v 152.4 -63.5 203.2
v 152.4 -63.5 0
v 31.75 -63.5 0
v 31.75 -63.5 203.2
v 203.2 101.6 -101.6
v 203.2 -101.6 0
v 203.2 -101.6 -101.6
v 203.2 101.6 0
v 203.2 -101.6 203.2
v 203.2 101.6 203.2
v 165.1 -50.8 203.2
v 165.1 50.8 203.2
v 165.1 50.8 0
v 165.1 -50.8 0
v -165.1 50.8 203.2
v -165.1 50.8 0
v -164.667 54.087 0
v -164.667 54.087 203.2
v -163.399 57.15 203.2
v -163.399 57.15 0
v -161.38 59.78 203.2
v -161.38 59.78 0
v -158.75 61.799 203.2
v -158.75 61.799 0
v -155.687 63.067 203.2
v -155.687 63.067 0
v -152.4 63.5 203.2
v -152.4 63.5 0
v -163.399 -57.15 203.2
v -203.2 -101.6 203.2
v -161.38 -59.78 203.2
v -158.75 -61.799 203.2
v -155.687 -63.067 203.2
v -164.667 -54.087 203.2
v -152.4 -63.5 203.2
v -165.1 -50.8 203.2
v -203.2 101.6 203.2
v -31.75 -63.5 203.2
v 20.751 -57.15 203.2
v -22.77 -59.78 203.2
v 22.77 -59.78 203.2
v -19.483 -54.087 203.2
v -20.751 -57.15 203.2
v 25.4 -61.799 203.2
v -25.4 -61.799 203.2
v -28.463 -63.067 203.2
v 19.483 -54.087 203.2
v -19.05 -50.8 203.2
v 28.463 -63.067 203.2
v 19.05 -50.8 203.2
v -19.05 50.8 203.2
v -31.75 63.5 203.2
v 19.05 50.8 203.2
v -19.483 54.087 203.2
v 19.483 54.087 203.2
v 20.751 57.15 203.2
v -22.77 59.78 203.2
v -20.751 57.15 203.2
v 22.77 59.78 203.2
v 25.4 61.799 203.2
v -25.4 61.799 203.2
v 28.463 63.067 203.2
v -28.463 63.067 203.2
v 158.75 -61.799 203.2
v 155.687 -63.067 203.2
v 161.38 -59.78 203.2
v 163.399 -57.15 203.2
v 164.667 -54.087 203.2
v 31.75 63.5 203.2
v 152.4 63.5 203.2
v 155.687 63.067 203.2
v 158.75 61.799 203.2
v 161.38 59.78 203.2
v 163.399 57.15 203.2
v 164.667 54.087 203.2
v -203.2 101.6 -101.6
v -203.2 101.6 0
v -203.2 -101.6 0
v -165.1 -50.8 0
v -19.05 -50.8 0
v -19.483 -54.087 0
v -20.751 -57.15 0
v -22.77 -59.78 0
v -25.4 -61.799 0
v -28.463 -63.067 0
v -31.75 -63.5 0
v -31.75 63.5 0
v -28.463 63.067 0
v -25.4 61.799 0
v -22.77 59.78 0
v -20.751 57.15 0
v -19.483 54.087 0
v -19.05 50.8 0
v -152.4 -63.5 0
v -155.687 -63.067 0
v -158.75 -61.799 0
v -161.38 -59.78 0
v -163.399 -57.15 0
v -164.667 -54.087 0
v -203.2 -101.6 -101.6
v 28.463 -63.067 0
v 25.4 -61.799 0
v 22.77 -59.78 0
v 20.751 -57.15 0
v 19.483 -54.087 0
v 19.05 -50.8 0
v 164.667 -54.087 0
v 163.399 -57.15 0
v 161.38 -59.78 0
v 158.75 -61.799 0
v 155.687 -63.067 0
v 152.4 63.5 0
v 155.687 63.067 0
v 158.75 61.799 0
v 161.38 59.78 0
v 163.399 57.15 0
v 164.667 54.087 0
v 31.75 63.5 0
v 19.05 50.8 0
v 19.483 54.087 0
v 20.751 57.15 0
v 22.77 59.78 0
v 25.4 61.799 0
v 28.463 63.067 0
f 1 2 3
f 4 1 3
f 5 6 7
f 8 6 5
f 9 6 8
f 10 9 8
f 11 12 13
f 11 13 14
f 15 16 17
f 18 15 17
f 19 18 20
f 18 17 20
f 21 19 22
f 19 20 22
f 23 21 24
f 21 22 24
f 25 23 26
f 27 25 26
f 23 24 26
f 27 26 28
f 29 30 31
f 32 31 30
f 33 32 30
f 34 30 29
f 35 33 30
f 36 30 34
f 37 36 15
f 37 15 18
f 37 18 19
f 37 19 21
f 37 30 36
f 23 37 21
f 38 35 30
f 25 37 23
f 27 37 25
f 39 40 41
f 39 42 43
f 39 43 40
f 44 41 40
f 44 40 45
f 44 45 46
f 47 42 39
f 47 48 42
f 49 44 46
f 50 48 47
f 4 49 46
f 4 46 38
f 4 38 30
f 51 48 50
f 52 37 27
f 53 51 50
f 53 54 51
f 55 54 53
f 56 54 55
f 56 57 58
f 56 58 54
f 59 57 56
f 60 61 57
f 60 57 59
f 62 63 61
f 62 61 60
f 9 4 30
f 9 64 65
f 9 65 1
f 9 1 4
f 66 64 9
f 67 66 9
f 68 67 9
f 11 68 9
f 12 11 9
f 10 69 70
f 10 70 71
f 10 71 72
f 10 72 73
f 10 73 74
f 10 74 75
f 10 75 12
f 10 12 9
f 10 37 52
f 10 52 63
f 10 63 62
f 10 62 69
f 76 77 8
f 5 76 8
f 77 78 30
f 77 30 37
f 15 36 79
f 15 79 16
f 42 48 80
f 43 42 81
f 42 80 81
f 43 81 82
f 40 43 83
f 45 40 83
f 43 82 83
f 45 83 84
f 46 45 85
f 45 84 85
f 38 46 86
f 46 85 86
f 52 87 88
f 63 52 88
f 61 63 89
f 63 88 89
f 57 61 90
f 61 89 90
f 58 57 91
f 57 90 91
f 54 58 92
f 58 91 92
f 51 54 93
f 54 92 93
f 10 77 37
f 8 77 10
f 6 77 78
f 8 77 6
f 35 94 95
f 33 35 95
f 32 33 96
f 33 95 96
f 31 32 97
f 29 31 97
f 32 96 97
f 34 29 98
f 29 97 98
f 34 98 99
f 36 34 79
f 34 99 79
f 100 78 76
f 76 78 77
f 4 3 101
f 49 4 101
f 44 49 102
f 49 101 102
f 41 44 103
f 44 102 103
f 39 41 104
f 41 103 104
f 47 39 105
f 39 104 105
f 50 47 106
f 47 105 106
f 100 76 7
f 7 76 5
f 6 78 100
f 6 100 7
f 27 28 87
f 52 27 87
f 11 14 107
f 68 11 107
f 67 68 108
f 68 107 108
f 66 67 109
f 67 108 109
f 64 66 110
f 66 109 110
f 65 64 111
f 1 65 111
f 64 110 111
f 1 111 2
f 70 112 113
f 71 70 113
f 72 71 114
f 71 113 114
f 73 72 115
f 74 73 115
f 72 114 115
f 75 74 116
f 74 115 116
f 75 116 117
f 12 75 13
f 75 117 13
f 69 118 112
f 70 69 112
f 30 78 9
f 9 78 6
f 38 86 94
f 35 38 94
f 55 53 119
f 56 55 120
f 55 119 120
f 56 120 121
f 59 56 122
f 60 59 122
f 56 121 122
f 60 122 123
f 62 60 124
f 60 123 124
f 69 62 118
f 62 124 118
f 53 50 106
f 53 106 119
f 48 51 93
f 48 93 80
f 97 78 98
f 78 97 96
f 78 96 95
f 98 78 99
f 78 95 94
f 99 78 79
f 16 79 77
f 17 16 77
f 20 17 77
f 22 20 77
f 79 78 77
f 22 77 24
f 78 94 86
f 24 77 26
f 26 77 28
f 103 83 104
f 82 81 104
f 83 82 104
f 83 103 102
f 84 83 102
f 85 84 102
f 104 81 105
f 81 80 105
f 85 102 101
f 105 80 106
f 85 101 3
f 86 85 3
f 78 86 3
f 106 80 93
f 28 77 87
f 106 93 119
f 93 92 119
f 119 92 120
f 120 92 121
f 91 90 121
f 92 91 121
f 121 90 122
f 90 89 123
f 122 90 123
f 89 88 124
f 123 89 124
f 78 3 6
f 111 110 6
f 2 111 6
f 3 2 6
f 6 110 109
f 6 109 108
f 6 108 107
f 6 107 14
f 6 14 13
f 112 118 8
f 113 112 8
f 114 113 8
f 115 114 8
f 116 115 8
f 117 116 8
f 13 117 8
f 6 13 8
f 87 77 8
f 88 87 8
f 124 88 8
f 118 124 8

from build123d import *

# Parameters (mm, degrees)
F1_W     = 406.4
F1_H     = 203.2
F2_DEPTH = 203.2
F3_DEPTH = 101.6


# Not quite as in the source:
# - a variable given as a bare number and used for a length is read in inches; the dataset says mm whatever the document's units were


with BuildPart() as f2:
    # F1 (on Top) → F2 (new body)
    with BuildSketch(Plane.XY):
        Rectangle(F1_W, F1_H)
        with BuildLine():
            ThreePointArc((-165.1, 50.8), (-161.3802561211, 59.7802561211), (-152.4, 63.5))
            Line((-152.4, 63.5), (-31.75, 63.5))
            ThreePointArc((-31.75, 63.5), (-22.7697438789, 59.7802561211), (-19.05, 50.8))
            Line((-19.05, 50.8), (-19.05, -50.8))
            ThreePointArc((-19.05, -50.8), (-22.7697438789, -59.7802561211), (-31.75, -63.5))
            Line((-31.75, -63.5), (-152.4, -63.5))
            ThreePointArc((-152.4, -63.5), (-161.3802561211, -59.7802561211), (-165.1, -50.8))
            Line((-165.1, -50.8), (-165.1, 50.8))
        make_face(mode=Mode.SUBTRACT)
        with BuildLine():
            Line((19.05, -50.8), (19.05, 50.8))
            ThreePointArc((19.05, 50.8), (22.7697438789, 59.7802561211), (31.75, 63.5))
            Line((31.75, 63.5), (152.4, 63.5))
            ThreePointArc((152.4, 63.5), (161.3802561211, 59.7802561211), (165.1, 50.8))
            Line((165.1, 50.8), (165.1, -50.8))
            ThreePointArc((165.1, -50.8), (161.3802561211, -59.7802561211), (152.4, -63.5))
            Line((152.4, -63.5), (31.75, -63.5))
            ThreePointArc((31.75, -63.5), (22.7697438789, -59.7802561211), (19.05, -50.8))
        make_face(mode=Mode.SUBTRACT)
    extrude(amount=F2_DEPTH)


with BuildPart() as f3:
    # F1 (on Top) → F3 (new body)
    with BuildSketch(Plane.XY):
        Rectangle(F1_W, F1_H)
        with BuildLine():
            ThreePointArc((-165.1, 50.8), (-161.3802561211, 59.7802561211), (-152.4, 63.5))
            Line((-152.4, 63.5), (-31.75, 63.5))
            ThreePointArc((-31.75, 63.5), (-22.7697438789, 59.7802561211), (-19.05, 50.8))
            Line((-19.05, 50.8), (-19.05, -50.8))
            ThreePointArc((-19.05, -50.8), (-22.7697438789, -59.7802561211), (-31.75, -63.5))
            Line((-31.75, -63.5), (-152.4, -63.5))
            ThreePointArc((-152.4, -63.5), (-161.3802561211, -59.7802561211), (-165.1, -50.8))
            Line((-165.1, -50.8), (-165.1, 50.8))
        make_face(mode=Mode.SUBTRACT)
        with BuildLine():
            Line((19.05, -50.8), (19.05, 50.8))
            ThreePointArc((19.05, 50.8), (22.7697438789, 59.7802561211), (31.75, 63.5))
            Line((31.75, 63.5), (152.4, 63.5))
            ThreePointArc((152.4, 63.5), (161.3802561211, 59.7802561211), (165.1, 50.8))
            Line((165.1, 50.8), (165.1, -50.8))
            ThreePointArc((165.1, -50.8), (161.3802561211, -59.7802561211), (152.4, -63.5))
            Line((152.4, -63.5), (31.75, -63.5))
            ThreePointArc((31.75, -63.5), (22.7697438789, -59.7802561211), (19.05, -50.8))
        make_face(mode=Mode.SUBTRACT)
        with BuildLine():
            Line((-31.75, 63.5), (-152.4, 63.5))
            ThreePointArc((-152.4, 63.5), (-161.3802561211, 59.7802561211), (-165.1, 50.8))
            Line((-165.1, 50.8), (-165.1, -50.8))
            ThreePointArc((-165.1, -50.8), (-161.3802561211, -59.7802561211), (-152.4, -63.5))
            Line((-152.4, -63.5), (-31.75, -63.5))
            ThreePointArc((-31.75, -63.5), (-22.7697438789, -59.7802561211), (-19.05, -50.8))
            Line((-19.05, -50.8), (-19.05, 50.8))
            ThreePointArc((-19.05, 50.8), (-22.7697438789, 59.7802561211), (-31.75, 63.5))
        make_face()
        with BuildLine():
            ThreePointArc((31.75, 63.5), (22.7697438789, 59.7802561211), (19.05, 50.8))
            Line((19.05, 50.8), (19.05, -50.8))
            ThreePointArc((19.05, -50.8), (22.7697438789, -59.7802561211), (31.75, -63.5))
            Line((31.75, -63.5), (152.4, -63.5))
            ThreePointArc((152.4, -63.5), (161.3802561211, -59.7802561211), (165.1, -50.8))
            Line((165.1, -50.8), (165.1, 50.8))
            ThreePointArc((165.1, 50.8), (161.3802561211, 59.7802561211), (152.4, 63.5))
            Line((152.4, 63.5), (31.75, 63.5))
        make_face()
    extrude(amount=-F3_DEPTH)


solid = Compound([f2.part, f3.part])
